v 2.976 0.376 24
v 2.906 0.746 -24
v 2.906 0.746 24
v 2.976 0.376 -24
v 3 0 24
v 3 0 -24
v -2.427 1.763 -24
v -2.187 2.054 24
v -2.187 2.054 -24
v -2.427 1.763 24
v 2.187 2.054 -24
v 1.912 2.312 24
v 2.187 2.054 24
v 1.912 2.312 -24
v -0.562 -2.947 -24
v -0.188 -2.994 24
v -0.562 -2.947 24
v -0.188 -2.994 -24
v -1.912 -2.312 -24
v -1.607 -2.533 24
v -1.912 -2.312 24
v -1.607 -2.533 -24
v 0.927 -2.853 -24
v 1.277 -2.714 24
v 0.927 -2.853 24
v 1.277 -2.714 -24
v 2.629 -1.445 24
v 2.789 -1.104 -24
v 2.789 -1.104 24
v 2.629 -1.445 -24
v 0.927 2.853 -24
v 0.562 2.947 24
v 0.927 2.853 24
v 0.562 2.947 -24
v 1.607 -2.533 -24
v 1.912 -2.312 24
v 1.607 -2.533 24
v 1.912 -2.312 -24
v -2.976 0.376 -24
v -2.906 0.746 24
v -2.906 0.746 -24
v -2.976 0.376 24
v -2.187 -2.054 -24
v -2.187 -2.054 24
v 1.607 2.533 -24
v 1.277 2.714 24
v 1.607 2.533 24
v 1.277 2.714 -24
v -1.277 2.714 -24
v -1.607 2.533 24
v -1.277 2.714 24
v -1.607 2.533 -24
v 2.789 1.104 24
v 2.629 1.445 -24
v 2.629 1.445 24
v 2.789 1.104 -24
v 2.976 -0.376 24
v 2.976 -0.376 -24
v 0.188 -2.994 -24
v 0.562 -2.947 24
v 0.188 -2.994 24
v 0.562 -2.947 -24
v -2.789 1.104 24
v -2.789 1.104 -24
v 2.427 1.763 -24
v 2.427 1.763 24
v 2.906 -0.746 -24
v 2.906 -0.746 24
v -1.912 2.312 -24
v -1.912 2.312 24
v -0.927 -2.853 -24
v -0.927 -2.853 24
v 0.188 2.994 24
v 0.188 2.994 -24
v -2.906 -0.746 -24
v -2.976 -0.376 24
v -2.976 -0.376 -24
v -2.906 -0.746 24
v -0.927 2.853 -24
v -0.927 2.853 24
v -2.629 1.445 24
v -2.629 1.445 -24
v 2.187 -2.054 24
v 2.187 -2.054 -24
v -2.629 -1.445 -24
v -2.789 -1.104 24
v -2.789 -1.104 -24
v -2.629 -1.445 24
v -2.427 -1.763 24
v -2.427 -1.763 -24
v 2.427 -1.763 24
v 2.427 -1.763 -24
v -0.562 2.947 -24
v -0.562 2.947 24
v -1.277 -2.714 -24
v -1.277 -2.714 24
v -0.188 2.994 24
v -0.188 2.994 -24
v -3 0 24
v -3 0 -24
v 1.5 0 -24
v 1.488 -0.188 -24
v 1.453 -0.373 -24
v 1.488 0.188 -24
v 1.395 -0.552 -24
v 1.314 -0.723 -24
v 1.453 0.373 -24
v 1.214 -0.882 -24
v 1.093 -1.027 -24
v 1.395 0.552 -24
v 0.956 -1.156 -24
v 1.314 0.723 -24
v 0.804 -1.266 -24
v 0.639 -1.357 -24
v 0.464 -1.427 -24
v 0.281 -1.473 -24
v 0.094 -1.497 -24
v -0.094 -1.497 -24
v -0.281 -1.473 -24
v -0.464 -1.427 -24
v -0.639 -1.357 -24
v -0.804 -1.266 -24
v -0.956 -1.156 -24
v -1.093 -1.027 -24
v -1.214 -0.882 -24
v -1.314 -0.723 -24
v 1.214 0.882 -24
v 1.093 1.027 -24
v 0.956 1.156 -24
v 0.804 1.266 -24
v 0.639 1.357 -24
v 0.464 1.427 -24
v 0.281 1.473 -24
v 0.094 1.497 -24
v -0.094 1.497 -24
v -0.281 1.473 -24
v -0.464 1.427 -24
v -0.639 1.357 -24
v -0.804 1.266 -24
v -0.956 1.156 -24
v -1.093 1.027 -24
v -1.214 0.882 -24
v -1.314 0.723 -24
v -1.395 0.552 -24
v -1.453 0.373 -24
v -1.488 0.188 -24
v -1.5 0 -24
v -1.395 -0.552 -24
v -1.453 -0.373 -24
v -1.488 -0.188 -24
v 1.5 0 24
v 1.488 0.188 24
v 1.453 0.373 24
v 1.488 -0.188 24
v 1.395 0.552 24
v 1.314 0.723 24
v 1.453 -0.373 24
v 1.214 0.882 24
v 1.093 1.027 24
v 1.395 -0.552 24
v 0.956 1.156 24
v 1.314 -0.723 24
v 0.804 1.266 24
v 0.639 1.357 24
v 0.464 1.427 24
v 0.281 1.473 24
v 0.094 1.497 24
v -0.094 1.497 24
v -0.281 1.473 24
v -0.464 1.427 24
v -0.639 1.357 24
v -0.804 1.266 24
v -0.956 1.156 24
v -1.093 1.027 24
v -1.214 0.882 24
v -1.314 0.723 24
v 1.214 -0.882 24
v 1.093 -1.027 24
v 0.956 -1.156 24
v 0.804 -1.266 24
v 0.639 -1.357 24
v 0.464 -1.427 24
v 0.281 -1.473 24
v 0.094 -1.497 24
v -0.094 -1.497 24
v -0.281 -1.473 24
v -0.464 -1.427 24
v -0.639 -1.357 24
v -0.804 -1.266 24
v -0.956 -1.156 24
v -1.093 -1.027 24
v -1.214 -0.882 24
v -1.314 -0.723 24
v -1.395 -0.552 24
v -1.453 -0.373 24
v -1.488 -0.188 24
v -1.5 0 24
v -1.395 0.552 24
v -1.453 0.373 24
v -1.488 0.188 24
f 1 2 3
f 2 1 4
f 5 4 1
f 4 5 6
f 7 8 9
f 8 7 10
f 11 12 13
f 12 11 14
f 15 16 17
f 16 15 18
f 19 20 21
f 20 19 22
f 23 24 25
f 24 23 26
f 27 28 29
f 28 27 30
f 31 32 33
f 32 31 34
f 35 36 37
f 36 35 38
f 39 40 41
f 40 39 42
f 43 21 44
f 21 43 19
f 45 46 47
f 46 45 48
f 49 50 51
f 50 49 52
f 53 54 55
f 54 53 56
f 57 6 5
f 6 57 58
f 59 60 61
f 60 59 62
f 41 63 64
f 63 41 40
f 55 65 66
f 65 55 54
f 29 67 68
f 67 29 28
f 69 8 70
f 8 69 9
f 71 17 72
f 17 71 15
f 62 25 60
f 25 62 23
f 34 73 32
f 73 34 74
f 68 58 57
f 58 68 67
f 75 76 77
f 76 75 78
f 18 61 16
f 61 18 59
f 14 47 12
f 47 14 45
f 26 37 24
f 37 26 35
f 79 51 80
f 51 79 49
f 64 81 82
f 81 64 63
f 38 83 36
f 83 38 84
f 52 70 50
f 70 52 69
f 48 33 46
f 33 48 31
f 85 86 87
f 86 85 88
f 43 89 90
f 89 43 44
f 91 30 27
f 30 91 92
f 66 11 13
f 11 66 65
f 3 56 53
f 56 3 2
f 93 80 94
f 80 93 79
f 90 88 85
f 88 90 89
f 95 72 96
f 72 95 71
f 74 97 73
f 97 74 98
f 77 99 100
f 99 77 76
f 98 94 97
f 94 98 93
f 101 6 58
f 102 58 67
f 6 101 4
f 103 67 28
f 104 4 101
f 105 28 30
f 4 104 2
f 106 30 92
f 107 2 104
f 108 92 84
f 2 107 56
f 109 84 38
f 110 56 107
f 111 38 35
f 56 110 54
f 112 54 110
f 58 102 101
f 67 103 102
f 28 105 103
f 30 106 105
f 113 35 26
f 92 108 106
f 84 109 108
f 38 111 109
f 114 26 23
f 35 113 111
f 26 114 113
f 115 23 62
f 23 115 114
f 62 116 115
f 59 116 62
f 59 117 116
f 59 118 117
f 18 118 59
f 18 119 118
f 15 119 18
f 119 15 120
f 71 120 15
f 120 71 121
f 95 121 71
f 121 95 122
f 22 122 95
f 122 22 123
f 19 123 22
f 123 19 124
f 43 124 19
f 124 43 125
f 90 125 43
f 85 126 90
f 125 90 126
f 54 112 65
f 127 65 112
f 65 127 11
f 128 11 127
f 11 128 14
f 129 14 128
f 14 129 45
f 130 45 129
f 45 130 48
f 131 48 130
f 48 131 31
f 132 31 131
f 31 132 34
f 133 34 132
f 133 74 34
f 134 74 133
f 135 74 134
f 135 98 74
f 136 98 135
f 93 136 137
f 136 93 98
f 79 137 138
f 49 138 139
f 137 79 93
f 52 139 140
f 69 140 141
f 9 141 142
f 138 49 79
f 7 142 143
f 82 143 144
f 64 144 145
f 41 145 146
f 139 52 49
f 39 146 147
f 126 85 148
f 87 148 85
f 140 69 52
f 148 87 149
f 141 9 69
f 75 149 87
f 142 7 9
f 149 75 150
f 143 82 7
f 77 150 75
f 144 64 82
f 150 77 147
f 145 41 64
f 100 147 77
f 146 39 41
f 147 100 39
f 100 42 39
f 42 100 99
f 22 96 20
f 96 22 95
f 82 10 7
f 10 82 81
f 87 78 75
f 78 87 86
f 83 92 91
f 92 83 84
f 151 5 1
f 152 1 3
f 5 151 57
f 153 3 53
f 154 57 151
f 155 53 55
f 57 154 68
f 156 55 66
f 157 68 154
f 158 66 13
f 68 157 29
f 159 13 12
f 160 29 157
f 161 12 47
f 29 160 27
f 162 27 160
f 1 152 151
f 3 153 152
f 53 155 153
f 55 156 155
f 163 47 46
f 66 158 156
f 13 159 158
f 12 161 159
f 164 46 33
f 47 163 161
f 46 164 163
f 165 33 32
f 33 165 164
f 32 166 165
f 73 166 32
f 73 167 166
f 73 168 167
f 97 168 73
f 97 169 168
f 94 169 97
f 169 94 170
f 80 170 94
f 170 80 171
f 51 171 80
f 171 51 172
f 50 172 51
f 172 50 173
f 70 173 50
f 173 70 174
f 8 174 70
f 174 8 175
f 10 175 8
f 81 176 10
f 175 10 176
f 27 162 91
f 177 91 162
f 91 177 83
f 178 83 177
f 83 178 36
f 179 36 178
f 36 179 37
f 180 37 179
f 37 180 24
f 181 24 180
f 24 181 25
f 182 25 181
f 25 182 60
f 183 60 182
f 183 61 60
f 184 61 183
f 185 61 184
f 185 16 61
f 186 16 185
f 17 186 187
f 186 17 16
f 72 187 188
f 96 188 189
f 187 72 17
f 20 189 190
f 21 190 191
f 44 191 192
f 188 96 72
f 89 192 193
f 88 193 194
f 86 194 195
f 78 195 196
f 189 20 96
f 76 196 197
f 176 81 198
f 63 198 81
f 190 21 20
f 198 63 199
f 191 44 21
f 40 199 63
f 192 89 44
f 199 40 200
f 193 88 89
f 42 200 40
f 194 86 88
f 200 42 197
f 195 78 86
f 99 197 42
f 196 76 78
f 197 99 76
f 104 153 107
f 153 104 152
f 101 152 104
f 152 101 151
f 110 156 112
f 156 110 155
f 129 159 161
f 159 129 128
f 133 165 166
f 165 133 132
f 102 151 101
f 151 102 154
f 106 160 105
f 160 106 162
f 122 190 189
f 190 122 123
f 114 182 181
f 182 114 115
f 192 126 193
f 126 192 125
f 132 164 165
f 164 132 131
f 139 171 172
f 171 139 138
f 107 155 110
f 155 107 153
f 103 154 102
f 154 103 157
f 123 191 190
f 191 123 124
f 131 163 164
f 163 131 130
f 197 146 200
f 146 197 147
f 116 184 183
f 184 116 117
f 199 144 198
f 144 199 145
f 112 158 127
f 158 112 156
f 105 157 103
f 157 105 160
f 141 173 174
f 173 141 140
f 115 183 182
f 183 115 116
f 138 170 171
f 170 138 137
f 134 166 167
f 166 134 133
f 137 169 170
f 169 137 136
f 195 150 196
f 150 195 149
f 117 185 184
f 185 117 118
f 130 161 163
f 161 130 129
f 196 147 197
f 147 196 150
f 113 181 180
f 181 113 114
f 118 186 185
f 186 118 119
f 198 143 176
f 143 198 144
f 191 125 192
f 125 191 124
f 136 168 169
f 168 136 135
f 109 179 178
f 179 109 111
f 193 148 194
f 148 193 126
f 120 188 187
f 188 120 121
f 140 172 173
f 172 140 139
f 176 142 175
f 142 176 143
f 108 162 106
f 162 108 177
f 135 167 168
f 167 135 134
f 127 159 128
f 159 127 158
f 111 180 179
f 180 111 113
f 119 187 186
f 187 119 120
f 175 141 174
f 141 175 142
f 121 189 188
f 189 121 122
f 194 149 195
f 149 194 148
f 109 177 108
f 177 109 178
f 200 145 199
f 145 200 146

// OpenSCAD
$fn = 50;


difference() {
	union() {
		translate(v = [0, 0, -24.0000000000]) {
			cylinder(h = 48, r = 3.0000000000);
		}
	}
	union() {
		translate(v = [0, 0, -100.0000000000]) {
			cylinder(h = 200, r = 1.5000000000);
		}
	}
}
